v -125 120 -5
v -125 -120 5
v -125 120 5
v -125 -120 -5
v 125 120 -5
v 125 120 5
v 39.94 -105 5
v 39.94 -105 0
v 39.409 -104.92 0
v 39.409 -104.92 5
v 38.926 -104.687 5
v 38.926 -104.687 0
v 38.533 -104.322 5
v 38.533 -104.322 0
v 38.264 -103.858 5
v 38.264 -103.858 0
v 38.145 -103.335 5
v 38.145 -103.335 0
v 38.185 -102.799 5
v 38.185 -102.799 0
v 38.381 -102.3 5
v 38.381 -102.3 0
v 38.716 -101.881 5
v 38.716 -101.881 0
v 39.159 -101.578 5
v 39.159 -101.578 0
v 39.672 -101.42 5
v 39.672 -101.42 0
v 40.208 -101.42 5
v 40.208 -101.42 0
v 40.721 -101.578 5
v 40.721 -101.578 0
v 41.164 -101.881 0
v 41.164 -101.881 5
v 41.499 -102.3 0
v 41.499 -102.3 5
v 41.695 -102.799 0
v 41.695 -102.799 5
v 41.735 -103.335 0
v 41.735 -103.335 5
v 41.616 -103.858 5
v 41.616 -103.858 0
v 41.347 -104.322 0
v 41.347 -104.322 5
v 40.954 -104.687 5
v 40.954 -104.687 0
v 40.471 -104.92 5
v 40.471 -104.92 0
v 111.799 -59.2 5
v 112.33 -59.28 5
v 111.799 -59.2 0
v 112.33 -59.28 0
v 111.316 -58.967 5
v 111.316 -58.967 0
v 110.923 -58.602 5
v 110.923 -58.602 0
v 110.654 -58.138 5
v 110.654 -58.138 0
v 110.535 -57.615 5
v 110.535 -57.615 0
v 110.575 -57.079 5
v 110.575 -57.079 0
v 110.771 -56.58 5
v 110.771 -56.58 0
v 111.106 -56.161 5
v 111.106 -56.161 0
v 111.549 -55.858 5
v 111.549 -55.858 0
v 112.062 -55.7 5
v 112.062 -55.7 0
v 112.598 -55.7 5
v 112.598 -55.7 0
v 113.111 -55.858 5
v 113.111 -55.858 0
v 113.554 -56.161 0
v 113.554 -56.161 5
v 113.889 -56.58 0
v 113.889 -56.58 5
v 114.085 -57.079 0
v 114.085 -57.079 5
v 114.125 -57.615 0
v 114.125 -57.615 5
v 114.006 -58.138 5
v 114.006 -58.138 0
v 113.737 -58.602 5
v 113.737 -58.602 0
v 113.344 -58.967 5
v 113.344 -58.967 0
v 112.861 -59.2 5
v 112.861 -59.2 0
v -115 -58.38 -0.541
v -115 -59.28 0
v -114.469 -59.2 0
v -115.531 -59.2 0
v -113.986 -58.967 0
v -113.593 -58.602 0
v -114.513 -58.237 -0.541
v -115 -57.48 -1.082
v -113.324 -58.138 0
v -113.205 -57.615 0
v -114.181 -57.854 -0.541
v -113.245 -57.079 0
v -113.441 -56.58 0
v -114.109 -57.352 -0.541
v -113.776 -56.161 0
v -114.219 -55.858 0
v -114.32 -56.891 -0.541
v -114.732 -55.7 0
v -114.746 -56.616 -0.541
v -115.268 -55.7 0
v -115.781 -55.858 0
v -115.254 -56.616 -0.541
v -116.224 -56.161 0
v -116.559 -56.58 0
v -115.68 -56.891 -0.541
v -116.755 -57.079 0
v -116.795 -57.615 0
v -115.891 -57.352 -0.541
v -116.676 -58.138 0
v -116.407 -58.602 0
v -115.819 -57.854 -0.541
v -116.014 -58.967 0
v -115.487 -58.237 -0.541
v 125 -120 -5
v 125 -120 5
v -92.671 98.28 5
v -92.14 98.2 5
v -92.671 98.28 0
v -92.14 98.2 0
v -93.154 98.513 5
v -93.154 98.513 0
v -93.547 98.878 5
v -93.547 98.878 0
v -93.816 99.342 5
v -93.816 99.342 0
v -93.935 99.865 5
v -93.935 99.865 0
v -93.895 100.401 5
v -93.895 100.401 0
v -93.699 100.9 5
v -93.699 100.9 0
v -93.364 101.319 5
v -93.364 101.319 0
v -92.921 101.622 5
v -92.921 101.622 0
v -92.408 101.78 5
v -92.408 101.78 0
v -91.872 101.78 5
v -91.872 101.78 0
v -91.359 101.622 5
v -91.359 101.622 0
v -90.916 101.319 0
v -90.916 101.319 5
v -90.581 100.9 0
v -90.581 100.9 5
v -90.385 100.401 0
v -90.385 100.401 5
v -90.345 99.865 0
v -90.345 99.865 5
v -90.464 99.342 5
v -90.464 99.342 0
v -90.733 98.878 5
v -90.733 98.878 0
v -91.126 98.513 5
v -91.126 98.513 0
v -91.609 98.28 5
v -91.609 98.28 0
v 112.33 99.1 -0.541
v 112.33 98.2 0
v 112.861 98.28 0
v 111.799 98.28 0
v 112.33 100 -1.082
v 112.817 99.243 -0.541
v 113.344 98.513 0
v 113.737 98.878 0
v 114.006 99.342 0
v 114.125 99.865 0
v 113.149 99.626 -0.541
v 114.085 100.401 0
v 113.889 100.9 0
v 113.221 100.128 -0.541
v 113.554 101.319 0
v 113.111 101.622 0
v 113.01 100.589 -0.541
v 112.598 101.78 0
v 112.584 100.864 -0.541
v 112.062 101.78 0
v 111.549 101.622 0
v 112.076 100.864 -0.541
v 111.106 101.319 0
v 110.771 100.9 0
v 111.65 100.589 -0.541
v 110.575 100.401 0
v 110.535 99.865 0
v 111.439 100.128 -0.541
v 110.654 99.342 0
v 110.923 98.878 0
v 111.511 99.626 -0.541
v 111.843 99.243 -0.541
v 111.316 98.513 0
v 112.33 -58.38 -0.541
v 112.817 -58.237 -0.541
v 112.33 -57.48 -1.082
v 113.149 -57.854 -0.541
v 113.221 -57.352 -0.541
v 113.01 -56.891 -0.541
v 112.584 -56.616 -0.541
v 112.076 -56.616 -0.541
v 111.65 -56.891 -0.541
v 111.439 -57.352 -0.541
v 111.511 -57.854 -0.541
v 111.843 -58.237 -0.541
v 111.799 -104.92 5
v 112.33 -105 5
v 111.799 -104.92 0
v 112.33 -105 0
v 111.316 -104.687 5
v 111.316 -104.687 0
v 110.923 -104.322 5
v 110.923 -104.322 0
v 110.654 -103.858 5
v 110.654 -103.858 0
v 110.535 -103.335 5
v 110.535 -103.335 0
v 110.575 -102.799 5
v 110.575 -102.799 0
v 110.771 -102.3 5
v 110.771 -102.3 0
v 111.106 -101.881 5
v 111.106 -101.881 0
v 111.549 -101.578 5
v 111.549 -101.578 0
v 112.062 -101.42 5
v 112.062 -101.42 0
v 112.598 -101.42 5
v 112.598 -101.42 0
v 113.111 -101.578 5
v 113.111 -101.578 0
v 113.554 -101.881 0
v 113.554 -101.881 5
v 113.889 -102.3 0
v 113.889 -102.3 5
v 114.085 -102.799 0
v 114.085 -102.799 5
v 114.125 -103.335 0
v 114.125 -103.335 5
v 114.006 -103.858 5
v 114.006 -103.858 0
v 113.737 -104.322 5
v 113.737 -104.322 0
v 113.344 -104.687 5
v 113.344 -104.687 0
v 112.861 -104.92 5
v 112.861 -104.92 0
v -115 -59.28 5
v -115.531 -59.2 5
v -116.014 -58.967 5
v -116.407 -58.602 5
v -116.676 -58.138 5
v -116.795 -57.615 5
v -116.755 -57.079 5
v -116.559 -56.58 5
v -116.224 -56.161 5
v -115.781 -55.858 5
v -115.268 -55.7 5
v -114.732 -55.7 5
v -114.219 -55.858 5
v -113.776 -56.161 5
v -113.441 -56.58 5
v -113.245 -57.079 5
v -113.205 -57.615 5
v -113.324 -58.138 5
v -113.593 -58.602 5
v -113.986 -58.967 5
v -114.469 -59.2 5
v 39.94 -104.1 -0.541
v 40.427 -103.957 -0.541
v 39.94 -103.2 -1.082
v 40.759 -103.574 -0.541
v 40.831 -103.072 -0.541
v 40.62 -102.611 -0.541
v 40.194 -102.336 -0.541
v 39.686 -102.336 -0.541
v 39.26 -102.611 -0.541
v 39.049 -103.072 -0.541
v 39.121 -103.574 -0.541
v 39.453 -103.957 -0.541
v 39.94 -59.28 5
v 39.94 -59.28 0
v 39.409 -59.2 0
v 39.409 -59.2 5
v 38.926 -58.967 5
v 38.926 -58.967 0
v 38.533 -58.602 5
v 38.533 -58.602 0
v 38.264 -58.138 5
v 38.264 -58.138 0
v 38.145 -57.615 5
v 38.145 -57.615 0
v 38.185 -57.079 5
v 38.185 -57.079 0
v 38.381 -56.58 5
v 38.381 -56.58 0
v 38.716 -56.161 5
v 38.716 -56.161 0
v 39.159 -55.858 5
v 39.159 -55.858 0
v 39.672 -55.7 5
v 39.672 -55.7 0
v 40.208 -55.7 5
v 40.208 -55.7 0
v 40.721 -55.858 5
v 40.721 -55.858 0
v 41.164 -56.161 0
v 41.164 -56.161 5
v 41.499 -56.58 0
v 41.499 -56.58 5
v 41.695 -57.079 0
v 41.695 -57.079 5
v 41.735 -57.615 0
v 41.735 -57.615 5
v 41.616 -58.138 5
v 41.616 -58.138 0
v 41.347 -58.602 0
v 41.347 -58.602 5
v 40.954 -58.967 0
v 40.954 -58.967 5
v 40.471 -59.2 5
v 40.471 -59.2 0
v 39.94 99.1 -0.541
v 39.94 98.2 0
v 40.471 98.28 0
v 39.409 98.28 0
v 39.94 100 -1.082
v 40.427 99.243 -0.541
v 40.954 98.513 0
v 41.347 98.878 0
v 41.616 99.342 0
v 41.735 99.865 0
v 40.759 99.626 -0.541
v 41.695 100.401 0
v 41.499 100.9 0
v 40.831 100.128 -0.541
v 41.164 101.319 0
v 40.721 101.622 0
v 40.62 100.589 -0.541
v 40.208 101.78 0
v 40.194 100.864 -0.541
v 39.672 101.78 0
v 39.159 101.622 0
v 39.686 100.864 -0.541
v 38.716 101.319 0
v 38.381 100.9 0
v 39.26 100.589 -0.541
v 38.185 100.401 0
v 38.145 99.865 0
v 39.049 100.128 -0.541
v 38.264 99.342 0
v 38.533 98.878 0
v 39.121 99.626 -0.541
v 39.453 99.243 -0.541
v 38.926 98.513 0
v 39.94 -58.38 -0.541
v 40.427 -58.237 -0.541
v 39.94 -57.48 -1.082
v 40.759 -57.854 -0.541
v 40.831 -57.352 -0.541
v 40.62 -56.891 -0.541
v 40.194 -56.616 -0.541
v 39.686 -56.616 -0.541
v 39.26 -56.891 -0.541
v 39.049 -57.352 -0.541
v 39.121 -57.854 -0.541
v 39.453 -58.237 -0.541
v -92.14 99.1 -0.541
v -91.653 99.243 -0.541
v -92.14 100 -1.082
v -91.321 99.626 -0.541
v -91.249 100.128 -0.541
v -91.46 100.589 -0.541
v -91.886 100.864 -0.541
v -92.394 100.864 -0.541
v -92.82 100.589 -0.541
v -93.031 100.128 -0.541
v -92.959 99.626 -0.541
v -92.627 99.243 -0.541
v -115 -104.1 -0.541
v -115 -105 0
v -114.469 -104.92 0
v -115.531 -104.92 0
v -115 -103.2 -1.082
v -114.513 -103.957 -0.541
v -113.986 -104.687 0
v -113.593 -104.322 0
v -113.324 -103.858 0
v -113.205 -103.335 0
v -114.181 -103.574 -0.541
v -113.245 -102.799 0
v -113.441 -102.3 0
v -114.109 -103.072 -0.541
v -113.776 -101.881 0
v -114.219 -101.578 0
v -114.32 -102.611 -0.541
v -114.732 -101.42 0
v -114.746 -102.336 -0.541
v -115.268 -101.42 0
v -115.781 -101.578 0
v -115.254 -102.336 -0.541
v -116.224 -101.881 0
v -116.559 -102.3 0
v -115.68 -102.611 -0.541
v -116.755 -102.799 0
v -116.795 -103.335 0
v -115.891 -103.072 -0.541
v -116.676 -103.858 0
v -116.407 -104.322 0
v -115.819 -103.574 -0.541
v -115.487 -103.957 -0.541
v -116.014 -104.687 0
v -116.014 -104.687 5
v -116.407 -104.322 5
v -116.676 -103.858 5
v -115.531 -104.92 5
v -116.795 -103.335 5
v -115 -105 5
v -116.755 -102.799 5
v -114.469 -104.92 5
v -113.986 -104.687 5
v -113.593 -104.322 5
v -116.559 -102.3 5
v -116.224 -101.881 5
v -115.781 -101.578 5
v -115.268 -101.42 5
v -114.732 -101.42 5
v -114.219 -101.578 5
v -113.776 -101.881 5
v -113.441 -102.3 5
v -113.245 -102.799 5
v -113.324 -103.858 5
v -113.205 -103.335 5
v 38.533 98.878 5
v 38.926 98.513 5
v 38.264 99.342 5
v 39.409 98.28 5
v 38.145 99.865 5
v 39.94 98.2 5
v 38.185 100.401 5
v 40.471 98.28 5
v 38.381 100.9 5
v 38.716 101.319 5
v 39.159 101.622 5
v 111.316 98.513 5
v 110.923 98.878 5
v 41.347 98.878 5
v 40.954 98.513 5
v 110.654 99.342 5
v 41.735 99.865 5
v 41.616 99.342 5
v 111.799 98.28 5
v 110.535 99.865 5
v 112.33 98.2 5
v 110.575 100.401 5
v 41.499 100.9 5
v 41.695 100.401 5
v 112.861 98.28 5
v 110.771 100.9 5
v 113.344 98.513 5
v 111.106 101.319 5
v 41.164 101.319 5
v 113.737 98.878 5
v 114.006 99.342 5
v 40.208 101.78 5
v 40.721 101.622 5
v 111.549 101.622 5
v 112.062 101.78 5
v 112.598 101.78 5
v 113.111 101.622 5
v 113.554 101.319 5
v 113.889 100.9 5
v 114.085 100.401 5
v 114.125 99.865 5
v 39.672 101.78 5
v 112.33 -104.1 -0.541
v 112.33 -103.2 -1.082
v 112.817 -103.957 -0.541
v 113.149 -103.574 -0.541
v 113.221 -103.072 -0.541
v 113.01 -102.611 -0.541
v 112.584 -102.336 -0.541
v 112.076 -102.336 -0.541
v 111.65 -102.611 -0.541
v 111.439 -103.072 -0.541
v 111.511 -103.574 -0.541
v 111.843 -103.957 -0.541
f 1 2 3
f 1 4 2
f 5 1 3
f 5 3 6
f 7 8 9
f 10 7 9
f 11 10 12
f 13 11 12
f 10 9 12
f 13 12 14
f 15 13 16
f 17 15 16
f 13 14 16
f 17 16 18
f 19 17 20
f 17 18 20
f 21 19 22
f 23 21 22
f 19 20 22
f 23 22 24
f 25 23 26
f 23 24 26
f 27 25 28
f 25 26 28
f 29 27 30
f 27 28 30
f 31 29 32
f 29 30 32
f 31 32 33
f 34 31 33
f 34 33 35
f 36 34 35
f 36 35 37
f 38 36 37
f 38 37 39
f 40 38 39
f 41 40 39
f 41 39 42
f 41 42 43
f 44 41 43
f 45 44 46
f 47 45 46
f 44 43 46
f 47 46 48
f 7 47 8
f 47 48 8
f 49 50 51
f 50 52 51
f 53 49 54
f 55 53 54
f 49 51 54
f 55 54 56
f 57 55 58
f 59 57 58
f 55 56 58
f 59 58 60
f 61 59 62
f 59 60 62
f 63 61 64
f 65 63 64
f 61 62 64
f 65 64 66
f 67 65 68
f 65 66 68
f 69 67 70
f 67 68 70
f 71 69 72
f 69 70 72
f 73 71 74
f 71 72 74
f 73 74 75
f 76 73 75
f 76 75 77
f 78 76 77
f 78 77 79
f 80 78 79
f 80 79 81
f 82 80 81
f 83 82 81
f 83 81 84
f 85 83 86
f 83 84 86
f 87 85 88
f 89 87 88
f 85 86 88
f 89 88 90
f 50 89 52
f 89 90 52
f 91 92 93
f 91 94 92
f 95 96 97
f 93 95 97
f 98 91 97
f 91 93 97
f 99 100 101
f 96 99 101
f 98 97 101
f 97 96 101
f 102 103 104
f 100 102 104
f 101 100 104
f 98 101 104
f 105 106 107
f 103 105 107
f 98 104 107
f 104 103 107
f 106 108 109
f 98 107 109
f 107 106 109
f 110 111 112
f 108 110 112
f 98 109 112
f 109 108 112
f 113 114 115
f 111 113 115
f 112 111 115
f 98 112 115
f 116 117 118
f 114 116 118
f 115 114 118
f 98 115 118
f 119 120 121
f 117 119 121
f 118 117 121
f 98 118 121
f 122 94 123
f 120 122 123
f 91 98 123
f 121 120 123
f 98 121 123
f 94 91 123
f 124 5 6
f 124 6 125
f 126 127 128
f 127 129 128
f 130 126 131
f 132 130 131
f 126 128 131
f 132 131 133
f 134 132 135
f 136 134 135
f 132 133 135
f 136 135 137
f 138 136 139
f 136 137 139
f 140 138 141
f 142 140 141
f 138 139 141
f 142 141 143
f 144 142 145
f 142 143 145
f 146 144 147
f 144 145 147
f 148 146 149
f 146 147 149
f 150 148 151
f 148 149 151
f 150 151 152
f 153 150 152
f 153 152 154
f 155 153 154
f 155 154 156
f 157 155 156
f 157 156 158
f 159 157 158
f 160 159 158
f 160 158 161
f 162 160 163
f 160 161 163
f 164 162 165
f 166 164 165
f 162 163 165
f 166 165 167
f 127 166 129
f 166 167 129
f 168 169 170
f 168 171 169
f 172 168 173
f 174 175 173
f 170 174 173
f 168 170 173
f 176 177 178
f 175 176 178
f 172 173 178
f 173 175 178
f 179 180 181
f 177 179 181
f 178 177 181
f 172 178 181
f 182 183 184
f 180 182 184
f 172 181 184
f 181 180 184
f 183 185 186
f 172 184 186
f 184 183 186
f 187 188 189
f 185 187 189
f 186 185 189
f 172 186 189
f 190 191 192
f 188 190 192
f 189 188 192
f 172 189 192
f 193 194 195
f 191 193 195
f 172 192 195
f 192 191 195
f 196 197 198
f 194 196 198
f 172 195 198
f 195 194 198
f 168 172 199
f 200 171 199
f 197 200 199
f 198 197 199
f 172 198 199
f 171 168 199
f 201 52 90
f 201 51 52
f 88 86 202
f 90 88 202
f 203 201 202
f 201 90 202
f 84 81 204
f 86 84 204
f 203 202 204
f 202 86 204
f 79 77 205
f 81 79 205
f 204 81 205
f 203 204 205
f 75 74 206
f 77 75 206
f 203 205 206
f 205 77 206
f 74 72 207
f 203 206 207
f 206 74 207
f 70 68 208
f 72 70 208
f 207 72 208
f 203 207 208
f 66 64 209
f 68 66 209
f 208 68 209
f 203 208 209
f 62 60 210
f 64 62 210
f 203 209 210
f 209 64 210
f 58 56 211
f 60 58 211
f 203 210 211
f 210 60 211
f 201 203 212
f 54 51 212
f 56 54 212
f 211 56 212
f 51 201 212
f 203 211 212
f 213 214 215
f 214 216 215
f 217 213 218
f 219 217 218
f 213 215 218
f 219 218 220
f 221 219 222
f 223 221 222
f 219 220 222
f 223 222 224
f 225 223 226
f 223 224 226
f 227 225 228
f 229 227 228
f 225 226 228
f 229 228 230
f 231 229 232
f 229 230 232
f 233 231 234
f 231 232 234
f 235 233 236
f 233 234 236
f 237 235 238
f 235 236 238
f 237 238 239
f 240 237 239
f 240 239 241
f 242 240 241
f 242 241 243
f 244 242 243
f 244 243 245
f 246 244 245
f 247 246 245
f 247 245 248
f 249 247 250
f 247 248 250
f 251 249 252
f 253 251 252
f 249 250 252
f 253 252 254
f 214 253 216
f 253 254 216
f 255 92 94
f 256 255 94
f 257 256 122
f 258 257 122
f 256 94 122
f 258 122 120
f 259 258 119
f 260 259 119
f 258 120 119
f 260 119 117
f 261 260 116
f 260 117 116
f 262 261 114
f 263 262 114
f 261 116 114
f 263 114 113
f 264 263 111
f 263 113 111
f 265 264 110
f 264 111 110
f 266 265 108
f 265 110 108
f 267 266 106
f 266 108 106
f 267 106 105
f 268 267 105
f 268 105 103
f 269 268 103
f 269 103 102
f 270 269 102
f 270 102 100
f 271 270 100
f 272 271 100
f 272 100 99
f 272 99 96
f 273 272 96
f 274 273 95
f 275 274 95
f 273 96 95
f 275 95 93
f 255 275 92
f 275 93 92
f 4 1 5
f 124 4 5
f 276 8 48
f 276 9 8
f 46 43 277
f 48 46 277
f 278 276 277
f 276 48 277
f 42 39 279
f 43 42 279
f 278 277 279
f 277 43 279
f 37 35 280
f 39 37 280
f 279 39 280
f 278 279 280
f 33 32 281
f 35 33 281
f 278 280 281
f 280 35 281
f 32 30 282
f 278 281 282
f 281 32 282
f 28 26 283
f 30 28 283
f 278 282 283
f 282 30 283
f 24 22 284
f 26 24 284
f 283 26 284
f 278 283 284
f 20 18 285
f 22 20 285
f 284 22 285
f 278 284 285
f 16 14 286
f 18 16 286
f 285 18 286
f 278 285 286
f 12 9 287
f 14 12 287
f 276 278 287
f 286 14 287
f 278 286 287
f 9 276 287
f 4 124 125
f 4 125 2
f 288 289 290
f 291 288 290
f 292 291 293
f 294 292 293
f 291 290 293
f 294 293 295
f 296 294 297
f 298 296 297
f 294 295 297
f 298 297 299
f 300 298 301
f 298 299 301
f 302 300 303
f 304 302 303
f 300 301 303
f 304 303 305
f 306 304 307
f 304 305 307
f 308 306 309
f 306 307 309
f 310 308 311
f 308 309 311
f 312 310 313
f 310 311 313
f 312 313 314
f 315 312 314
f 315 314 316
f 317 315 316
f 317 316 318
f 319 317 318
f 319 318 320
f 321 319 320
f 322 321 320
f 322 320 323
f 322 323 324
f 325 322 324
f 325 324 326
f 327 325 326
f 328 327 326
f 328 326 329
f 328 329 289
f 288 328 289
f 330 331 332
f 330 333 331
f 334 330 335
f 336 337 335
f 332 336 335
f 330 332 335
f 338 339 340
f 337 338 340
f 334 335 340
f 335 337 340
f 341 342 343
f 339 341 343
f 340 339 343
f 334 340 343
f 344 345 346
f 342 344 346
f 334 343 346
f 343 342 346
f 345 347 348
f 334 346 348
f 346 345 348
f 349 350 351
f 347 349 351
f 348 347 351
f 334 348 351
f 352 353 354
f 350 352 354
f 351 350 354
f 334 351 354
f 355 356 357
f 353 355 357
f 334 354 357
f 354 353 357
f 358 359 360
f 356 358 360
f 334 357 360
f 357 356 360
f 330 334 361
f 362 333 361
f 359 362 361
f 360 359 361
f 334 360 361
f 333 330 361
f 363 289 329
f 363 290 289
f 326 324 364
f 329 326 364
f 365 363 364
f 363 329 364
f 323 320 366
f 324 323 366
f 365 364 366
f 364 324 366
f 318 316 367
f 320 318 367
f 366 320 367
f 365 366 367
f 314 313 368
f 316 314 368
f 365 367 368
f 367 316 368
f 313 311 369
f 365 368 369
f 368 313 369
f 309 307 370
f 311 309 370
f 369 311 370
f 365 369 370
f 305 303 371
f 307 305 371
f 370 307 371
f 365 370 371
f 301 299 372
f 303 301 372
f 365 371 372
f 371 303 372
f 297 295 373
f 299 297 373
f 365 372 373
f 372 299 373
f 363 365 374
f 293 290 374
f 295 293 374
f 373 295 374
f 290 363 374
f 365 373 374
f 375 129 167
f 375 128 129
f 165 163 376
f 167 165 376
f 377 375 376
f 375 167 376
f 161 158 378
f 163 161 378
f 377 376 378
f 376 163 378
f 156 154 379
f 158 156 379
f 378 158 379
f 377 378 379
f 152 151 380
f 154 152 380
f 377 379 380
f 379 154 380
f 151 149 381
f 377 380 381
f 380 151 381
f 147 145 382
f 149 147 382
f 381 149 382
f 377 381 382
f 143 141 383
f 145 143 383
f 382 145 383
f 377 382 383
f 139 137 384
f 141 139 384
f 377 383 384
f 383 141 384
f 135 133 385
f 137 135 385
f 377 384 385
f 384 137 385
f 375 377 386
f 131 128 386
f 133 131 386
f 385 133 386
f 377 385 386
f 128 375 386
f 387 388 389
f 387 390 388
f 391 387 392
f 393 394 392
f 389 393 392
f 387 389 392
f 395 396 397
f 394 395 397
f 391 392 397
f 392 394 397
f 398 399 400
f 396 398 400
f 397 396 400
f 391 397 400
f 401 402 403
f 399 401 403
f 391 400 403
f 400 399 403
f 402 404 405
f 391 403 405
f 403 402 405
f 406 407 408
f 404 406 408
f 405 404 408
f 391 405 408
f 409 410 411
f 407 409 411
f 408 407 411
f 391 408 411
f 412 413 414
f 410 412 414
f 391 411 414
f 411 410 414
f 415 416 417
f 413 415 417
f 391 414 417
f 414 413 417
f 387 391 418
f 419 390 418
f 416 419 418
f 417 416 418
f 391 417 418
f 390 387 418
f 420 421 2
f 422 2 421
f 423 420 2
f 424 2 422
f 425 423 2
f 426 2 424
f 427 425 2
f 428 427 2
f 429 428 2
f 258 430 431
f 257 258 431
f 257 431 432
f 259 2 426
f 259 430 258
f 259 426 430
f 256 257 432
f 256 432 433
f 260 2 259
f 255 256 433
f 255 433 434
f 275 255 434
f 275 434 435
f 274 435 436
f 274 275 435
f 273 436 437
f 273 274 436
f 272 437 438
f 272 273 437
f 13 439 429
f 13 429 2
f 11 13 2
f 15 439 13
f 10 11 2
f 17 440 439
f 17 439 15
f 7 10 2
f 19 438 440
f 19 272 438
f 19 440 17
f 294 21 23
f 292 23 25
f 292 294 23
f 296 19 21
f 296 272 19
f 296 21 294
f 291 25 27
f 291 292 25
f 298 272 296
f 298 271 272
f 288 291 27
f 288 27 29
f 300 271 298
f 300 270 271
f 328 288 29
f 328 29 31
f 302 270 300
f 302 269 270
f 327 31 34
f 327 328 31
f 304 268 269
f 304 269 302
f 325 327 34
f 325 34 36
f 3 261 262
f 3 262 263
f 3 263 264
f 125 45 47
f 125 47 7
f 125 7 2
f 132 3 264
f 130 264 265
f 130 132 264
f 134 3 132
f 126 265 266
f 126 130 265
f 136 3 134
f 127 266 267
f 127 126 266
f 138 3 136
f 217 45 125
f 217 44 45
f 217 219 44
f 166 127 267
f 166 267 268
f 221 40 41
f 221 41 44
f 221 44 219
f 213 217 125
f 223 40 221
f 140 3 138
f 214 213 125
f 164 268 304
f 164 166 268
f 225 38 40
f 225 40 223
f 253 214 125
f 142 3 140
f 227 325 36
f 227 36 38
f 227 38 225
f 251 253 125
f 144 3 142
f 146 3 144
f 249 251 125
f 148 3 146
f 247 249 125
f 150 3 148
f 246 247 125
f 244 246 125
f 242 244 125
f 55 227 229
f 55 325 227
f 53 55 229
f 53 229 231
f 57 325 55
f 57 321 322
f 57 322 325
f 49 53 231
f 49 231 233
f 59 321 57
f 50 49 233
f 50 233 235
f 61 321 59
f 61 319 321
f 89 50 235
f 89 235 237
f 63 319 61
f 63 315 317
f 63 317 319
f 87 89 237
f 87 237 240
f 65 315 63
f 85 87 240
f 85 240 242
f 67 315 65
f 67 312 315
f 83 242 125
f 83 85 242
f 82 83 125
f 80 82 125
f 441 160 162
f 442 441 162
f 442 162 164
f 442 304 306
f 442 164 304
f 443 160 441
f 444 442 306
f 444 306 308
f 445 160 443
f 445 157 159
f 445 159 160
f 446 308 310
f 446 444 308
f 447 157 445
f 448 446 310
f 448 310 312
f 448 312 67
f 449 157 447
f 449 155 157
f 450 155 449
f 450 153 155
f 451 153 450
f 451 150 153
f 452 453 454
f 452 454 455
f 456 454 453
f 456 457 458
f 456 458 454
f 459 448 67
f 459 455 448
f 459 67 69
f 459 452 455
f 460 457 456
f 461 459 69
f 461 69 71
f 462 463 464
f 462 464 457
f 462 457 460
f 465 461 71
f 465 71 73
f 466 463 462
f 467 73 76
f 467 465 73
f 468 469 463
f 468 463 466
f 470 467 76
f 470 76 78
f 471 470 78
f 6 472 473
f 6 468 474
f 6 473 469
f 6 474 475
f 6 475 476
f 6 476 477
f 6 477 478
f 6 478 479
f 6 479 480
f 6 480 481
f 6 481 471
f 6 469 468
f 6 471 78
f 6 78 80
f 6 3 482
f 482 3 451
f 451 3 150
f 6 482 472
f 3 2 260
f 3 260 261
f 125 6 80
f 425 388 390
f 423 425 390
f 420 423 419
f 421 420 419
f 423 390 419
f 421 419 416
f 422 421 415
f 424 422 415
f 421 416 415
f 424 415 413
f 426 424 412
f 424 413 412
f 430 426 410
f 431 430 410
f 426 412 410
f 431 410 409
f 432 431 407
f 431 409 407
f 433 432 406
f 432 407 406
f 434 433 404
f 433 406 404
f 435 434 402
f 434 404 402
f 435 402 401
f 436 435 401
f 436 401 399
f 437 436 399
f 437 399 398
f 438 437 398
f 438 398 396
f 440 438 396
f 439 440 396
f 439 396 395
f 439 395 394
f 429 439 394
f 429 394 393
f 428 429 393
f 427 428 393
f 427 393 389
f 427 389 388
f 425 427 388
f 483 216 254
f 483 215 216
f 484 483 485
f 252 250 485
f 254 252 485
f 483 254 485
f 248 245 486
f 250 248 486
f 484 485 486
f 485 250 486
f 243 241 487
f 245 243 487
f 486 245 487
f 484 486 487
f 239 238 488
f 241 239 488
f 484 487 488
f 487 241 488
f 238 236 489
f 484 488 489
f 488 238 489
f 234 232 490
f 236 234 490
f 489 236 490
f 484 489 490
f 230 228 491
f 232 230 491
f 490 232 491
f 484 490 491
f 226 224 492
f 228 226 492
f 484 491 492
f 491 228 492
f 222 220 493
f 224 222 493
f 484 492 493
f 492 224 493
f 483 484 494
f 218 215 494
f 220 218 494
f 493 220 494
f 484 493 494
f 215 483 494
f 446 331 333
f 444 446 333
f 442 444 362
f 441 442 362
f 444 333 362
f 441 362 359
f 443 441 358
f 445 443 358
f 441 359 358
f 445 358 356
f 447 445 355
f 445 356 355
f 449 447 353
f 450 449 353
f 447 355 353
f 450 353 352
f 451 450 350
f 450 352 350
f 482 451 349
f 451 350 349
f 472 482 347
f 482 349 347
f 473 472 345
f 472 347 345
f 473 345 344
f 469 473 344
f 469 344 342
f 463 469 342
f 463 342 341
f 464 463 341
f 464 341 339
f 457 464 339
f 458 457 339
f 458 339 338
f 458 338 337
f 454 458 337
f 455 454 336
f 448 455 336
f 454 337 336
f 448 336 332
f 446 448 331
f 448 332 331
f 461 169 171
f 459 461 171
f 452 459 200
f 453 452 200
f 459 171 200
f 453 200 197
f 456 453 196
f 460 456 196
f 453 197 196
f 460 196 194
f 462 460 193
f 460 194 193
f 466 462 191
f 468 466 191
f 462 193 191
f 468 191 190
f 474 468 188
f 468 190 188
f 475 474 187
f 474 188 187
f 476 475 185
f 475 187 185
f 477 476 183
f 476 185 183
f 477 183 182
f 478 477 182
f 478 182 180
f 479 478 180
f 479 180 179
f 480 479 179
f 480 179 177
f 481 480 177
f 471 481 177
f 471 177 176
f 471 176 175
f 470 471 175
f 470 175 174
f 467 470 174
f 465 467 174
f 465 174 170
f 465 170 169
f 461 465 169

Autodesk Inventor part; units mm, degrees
ref_plane "YZ Plane" through (0, 0, 0) normal (1, 0, 0) x (0, 1, 0)
ref_plane "XZ Plane" through (0, 0, 0) normal (0, 1, 0) x (-1, 0, 0)
ref_plane "XY Plane" through (0, 0, 0) normal (0, 0, 1) x (1, 0, 0)
sketch "Sketch1" plane through (0, 0, 0) normal (0, 0, 1) x (1, 0, 0)
  line L0 (-125, 120) -> (125, 120)
  line L1 (125, 120) -> (125, -120)
  line L2 (125, -120) -> (-125, -120)
  line L3 (-125, -120) -> (-125, 120)
  point P0 (0, 0)
  dimension "d0" = 250
  dimension "d1" = 240
  dimension "d2" = 125
  dimension "d3" = 120
extrude "Extrusion1" add sketch "Sketch1" along normal mid plane 10
sketch "Sketch5" plane through (0, 0, 5) normal (0, 0, 1) x (1, 0, 0)
  line L0 (-115, 100) -> (-115, -103.2)
  line L1 (-92.14, 100) -> (-92.14, -103.2)
  line L2 (39.94, 100) -> (39.94, -103.2)
  line L3 (112.33, 100) -> (112.33, -103.2)
  line L4 (-92.14, 100) -> (112.33, 100)
  line L5 (-115, -57.48) -> (39.94, -57.48)
  line L6 (112.33, -57.48) -> (39.94, -57.48)
  line L7 (-115, -103.2) -> (39.94, -103.2)
  line L8 (112.33, -103.2) -> (39.94, -103.2)
  line L9 (-115, 100) -> (-92.14, 100)
  line L10 (-125, 120) -> (-125, -120) projected
  line L11 (125, 120) -> (-125, 120) projected
  point P0 (0, 0)
  dimension "d25" = 10
  dimension "d26" = 22.86
  dimension "d27" = 72.39
  dimension "d28" = 132.08
  dimension "d29" = 45.72
  dimension "d30" = 157.48
  dimension "d38" = 20
hole "Hole2" at (-92.14, 100, 5) at (39.94, 100, 5) at (112.33, 100, 5) at (112.33, -57.48, 5) at (39.94, -57.48, 5) at (39.94, -103.2, 5) at (112.33, -103.2, 5) at (-115, -57.48, 5) at (-115, -103.2, 5) direction (0, 0, -1) diameter 3.6 depth 5 tip angle 118
equation "\"d2\" = 0.5 * d0"
equation "\"d3\" = 0.5 * d1"
properties part number "newMATXMount"
